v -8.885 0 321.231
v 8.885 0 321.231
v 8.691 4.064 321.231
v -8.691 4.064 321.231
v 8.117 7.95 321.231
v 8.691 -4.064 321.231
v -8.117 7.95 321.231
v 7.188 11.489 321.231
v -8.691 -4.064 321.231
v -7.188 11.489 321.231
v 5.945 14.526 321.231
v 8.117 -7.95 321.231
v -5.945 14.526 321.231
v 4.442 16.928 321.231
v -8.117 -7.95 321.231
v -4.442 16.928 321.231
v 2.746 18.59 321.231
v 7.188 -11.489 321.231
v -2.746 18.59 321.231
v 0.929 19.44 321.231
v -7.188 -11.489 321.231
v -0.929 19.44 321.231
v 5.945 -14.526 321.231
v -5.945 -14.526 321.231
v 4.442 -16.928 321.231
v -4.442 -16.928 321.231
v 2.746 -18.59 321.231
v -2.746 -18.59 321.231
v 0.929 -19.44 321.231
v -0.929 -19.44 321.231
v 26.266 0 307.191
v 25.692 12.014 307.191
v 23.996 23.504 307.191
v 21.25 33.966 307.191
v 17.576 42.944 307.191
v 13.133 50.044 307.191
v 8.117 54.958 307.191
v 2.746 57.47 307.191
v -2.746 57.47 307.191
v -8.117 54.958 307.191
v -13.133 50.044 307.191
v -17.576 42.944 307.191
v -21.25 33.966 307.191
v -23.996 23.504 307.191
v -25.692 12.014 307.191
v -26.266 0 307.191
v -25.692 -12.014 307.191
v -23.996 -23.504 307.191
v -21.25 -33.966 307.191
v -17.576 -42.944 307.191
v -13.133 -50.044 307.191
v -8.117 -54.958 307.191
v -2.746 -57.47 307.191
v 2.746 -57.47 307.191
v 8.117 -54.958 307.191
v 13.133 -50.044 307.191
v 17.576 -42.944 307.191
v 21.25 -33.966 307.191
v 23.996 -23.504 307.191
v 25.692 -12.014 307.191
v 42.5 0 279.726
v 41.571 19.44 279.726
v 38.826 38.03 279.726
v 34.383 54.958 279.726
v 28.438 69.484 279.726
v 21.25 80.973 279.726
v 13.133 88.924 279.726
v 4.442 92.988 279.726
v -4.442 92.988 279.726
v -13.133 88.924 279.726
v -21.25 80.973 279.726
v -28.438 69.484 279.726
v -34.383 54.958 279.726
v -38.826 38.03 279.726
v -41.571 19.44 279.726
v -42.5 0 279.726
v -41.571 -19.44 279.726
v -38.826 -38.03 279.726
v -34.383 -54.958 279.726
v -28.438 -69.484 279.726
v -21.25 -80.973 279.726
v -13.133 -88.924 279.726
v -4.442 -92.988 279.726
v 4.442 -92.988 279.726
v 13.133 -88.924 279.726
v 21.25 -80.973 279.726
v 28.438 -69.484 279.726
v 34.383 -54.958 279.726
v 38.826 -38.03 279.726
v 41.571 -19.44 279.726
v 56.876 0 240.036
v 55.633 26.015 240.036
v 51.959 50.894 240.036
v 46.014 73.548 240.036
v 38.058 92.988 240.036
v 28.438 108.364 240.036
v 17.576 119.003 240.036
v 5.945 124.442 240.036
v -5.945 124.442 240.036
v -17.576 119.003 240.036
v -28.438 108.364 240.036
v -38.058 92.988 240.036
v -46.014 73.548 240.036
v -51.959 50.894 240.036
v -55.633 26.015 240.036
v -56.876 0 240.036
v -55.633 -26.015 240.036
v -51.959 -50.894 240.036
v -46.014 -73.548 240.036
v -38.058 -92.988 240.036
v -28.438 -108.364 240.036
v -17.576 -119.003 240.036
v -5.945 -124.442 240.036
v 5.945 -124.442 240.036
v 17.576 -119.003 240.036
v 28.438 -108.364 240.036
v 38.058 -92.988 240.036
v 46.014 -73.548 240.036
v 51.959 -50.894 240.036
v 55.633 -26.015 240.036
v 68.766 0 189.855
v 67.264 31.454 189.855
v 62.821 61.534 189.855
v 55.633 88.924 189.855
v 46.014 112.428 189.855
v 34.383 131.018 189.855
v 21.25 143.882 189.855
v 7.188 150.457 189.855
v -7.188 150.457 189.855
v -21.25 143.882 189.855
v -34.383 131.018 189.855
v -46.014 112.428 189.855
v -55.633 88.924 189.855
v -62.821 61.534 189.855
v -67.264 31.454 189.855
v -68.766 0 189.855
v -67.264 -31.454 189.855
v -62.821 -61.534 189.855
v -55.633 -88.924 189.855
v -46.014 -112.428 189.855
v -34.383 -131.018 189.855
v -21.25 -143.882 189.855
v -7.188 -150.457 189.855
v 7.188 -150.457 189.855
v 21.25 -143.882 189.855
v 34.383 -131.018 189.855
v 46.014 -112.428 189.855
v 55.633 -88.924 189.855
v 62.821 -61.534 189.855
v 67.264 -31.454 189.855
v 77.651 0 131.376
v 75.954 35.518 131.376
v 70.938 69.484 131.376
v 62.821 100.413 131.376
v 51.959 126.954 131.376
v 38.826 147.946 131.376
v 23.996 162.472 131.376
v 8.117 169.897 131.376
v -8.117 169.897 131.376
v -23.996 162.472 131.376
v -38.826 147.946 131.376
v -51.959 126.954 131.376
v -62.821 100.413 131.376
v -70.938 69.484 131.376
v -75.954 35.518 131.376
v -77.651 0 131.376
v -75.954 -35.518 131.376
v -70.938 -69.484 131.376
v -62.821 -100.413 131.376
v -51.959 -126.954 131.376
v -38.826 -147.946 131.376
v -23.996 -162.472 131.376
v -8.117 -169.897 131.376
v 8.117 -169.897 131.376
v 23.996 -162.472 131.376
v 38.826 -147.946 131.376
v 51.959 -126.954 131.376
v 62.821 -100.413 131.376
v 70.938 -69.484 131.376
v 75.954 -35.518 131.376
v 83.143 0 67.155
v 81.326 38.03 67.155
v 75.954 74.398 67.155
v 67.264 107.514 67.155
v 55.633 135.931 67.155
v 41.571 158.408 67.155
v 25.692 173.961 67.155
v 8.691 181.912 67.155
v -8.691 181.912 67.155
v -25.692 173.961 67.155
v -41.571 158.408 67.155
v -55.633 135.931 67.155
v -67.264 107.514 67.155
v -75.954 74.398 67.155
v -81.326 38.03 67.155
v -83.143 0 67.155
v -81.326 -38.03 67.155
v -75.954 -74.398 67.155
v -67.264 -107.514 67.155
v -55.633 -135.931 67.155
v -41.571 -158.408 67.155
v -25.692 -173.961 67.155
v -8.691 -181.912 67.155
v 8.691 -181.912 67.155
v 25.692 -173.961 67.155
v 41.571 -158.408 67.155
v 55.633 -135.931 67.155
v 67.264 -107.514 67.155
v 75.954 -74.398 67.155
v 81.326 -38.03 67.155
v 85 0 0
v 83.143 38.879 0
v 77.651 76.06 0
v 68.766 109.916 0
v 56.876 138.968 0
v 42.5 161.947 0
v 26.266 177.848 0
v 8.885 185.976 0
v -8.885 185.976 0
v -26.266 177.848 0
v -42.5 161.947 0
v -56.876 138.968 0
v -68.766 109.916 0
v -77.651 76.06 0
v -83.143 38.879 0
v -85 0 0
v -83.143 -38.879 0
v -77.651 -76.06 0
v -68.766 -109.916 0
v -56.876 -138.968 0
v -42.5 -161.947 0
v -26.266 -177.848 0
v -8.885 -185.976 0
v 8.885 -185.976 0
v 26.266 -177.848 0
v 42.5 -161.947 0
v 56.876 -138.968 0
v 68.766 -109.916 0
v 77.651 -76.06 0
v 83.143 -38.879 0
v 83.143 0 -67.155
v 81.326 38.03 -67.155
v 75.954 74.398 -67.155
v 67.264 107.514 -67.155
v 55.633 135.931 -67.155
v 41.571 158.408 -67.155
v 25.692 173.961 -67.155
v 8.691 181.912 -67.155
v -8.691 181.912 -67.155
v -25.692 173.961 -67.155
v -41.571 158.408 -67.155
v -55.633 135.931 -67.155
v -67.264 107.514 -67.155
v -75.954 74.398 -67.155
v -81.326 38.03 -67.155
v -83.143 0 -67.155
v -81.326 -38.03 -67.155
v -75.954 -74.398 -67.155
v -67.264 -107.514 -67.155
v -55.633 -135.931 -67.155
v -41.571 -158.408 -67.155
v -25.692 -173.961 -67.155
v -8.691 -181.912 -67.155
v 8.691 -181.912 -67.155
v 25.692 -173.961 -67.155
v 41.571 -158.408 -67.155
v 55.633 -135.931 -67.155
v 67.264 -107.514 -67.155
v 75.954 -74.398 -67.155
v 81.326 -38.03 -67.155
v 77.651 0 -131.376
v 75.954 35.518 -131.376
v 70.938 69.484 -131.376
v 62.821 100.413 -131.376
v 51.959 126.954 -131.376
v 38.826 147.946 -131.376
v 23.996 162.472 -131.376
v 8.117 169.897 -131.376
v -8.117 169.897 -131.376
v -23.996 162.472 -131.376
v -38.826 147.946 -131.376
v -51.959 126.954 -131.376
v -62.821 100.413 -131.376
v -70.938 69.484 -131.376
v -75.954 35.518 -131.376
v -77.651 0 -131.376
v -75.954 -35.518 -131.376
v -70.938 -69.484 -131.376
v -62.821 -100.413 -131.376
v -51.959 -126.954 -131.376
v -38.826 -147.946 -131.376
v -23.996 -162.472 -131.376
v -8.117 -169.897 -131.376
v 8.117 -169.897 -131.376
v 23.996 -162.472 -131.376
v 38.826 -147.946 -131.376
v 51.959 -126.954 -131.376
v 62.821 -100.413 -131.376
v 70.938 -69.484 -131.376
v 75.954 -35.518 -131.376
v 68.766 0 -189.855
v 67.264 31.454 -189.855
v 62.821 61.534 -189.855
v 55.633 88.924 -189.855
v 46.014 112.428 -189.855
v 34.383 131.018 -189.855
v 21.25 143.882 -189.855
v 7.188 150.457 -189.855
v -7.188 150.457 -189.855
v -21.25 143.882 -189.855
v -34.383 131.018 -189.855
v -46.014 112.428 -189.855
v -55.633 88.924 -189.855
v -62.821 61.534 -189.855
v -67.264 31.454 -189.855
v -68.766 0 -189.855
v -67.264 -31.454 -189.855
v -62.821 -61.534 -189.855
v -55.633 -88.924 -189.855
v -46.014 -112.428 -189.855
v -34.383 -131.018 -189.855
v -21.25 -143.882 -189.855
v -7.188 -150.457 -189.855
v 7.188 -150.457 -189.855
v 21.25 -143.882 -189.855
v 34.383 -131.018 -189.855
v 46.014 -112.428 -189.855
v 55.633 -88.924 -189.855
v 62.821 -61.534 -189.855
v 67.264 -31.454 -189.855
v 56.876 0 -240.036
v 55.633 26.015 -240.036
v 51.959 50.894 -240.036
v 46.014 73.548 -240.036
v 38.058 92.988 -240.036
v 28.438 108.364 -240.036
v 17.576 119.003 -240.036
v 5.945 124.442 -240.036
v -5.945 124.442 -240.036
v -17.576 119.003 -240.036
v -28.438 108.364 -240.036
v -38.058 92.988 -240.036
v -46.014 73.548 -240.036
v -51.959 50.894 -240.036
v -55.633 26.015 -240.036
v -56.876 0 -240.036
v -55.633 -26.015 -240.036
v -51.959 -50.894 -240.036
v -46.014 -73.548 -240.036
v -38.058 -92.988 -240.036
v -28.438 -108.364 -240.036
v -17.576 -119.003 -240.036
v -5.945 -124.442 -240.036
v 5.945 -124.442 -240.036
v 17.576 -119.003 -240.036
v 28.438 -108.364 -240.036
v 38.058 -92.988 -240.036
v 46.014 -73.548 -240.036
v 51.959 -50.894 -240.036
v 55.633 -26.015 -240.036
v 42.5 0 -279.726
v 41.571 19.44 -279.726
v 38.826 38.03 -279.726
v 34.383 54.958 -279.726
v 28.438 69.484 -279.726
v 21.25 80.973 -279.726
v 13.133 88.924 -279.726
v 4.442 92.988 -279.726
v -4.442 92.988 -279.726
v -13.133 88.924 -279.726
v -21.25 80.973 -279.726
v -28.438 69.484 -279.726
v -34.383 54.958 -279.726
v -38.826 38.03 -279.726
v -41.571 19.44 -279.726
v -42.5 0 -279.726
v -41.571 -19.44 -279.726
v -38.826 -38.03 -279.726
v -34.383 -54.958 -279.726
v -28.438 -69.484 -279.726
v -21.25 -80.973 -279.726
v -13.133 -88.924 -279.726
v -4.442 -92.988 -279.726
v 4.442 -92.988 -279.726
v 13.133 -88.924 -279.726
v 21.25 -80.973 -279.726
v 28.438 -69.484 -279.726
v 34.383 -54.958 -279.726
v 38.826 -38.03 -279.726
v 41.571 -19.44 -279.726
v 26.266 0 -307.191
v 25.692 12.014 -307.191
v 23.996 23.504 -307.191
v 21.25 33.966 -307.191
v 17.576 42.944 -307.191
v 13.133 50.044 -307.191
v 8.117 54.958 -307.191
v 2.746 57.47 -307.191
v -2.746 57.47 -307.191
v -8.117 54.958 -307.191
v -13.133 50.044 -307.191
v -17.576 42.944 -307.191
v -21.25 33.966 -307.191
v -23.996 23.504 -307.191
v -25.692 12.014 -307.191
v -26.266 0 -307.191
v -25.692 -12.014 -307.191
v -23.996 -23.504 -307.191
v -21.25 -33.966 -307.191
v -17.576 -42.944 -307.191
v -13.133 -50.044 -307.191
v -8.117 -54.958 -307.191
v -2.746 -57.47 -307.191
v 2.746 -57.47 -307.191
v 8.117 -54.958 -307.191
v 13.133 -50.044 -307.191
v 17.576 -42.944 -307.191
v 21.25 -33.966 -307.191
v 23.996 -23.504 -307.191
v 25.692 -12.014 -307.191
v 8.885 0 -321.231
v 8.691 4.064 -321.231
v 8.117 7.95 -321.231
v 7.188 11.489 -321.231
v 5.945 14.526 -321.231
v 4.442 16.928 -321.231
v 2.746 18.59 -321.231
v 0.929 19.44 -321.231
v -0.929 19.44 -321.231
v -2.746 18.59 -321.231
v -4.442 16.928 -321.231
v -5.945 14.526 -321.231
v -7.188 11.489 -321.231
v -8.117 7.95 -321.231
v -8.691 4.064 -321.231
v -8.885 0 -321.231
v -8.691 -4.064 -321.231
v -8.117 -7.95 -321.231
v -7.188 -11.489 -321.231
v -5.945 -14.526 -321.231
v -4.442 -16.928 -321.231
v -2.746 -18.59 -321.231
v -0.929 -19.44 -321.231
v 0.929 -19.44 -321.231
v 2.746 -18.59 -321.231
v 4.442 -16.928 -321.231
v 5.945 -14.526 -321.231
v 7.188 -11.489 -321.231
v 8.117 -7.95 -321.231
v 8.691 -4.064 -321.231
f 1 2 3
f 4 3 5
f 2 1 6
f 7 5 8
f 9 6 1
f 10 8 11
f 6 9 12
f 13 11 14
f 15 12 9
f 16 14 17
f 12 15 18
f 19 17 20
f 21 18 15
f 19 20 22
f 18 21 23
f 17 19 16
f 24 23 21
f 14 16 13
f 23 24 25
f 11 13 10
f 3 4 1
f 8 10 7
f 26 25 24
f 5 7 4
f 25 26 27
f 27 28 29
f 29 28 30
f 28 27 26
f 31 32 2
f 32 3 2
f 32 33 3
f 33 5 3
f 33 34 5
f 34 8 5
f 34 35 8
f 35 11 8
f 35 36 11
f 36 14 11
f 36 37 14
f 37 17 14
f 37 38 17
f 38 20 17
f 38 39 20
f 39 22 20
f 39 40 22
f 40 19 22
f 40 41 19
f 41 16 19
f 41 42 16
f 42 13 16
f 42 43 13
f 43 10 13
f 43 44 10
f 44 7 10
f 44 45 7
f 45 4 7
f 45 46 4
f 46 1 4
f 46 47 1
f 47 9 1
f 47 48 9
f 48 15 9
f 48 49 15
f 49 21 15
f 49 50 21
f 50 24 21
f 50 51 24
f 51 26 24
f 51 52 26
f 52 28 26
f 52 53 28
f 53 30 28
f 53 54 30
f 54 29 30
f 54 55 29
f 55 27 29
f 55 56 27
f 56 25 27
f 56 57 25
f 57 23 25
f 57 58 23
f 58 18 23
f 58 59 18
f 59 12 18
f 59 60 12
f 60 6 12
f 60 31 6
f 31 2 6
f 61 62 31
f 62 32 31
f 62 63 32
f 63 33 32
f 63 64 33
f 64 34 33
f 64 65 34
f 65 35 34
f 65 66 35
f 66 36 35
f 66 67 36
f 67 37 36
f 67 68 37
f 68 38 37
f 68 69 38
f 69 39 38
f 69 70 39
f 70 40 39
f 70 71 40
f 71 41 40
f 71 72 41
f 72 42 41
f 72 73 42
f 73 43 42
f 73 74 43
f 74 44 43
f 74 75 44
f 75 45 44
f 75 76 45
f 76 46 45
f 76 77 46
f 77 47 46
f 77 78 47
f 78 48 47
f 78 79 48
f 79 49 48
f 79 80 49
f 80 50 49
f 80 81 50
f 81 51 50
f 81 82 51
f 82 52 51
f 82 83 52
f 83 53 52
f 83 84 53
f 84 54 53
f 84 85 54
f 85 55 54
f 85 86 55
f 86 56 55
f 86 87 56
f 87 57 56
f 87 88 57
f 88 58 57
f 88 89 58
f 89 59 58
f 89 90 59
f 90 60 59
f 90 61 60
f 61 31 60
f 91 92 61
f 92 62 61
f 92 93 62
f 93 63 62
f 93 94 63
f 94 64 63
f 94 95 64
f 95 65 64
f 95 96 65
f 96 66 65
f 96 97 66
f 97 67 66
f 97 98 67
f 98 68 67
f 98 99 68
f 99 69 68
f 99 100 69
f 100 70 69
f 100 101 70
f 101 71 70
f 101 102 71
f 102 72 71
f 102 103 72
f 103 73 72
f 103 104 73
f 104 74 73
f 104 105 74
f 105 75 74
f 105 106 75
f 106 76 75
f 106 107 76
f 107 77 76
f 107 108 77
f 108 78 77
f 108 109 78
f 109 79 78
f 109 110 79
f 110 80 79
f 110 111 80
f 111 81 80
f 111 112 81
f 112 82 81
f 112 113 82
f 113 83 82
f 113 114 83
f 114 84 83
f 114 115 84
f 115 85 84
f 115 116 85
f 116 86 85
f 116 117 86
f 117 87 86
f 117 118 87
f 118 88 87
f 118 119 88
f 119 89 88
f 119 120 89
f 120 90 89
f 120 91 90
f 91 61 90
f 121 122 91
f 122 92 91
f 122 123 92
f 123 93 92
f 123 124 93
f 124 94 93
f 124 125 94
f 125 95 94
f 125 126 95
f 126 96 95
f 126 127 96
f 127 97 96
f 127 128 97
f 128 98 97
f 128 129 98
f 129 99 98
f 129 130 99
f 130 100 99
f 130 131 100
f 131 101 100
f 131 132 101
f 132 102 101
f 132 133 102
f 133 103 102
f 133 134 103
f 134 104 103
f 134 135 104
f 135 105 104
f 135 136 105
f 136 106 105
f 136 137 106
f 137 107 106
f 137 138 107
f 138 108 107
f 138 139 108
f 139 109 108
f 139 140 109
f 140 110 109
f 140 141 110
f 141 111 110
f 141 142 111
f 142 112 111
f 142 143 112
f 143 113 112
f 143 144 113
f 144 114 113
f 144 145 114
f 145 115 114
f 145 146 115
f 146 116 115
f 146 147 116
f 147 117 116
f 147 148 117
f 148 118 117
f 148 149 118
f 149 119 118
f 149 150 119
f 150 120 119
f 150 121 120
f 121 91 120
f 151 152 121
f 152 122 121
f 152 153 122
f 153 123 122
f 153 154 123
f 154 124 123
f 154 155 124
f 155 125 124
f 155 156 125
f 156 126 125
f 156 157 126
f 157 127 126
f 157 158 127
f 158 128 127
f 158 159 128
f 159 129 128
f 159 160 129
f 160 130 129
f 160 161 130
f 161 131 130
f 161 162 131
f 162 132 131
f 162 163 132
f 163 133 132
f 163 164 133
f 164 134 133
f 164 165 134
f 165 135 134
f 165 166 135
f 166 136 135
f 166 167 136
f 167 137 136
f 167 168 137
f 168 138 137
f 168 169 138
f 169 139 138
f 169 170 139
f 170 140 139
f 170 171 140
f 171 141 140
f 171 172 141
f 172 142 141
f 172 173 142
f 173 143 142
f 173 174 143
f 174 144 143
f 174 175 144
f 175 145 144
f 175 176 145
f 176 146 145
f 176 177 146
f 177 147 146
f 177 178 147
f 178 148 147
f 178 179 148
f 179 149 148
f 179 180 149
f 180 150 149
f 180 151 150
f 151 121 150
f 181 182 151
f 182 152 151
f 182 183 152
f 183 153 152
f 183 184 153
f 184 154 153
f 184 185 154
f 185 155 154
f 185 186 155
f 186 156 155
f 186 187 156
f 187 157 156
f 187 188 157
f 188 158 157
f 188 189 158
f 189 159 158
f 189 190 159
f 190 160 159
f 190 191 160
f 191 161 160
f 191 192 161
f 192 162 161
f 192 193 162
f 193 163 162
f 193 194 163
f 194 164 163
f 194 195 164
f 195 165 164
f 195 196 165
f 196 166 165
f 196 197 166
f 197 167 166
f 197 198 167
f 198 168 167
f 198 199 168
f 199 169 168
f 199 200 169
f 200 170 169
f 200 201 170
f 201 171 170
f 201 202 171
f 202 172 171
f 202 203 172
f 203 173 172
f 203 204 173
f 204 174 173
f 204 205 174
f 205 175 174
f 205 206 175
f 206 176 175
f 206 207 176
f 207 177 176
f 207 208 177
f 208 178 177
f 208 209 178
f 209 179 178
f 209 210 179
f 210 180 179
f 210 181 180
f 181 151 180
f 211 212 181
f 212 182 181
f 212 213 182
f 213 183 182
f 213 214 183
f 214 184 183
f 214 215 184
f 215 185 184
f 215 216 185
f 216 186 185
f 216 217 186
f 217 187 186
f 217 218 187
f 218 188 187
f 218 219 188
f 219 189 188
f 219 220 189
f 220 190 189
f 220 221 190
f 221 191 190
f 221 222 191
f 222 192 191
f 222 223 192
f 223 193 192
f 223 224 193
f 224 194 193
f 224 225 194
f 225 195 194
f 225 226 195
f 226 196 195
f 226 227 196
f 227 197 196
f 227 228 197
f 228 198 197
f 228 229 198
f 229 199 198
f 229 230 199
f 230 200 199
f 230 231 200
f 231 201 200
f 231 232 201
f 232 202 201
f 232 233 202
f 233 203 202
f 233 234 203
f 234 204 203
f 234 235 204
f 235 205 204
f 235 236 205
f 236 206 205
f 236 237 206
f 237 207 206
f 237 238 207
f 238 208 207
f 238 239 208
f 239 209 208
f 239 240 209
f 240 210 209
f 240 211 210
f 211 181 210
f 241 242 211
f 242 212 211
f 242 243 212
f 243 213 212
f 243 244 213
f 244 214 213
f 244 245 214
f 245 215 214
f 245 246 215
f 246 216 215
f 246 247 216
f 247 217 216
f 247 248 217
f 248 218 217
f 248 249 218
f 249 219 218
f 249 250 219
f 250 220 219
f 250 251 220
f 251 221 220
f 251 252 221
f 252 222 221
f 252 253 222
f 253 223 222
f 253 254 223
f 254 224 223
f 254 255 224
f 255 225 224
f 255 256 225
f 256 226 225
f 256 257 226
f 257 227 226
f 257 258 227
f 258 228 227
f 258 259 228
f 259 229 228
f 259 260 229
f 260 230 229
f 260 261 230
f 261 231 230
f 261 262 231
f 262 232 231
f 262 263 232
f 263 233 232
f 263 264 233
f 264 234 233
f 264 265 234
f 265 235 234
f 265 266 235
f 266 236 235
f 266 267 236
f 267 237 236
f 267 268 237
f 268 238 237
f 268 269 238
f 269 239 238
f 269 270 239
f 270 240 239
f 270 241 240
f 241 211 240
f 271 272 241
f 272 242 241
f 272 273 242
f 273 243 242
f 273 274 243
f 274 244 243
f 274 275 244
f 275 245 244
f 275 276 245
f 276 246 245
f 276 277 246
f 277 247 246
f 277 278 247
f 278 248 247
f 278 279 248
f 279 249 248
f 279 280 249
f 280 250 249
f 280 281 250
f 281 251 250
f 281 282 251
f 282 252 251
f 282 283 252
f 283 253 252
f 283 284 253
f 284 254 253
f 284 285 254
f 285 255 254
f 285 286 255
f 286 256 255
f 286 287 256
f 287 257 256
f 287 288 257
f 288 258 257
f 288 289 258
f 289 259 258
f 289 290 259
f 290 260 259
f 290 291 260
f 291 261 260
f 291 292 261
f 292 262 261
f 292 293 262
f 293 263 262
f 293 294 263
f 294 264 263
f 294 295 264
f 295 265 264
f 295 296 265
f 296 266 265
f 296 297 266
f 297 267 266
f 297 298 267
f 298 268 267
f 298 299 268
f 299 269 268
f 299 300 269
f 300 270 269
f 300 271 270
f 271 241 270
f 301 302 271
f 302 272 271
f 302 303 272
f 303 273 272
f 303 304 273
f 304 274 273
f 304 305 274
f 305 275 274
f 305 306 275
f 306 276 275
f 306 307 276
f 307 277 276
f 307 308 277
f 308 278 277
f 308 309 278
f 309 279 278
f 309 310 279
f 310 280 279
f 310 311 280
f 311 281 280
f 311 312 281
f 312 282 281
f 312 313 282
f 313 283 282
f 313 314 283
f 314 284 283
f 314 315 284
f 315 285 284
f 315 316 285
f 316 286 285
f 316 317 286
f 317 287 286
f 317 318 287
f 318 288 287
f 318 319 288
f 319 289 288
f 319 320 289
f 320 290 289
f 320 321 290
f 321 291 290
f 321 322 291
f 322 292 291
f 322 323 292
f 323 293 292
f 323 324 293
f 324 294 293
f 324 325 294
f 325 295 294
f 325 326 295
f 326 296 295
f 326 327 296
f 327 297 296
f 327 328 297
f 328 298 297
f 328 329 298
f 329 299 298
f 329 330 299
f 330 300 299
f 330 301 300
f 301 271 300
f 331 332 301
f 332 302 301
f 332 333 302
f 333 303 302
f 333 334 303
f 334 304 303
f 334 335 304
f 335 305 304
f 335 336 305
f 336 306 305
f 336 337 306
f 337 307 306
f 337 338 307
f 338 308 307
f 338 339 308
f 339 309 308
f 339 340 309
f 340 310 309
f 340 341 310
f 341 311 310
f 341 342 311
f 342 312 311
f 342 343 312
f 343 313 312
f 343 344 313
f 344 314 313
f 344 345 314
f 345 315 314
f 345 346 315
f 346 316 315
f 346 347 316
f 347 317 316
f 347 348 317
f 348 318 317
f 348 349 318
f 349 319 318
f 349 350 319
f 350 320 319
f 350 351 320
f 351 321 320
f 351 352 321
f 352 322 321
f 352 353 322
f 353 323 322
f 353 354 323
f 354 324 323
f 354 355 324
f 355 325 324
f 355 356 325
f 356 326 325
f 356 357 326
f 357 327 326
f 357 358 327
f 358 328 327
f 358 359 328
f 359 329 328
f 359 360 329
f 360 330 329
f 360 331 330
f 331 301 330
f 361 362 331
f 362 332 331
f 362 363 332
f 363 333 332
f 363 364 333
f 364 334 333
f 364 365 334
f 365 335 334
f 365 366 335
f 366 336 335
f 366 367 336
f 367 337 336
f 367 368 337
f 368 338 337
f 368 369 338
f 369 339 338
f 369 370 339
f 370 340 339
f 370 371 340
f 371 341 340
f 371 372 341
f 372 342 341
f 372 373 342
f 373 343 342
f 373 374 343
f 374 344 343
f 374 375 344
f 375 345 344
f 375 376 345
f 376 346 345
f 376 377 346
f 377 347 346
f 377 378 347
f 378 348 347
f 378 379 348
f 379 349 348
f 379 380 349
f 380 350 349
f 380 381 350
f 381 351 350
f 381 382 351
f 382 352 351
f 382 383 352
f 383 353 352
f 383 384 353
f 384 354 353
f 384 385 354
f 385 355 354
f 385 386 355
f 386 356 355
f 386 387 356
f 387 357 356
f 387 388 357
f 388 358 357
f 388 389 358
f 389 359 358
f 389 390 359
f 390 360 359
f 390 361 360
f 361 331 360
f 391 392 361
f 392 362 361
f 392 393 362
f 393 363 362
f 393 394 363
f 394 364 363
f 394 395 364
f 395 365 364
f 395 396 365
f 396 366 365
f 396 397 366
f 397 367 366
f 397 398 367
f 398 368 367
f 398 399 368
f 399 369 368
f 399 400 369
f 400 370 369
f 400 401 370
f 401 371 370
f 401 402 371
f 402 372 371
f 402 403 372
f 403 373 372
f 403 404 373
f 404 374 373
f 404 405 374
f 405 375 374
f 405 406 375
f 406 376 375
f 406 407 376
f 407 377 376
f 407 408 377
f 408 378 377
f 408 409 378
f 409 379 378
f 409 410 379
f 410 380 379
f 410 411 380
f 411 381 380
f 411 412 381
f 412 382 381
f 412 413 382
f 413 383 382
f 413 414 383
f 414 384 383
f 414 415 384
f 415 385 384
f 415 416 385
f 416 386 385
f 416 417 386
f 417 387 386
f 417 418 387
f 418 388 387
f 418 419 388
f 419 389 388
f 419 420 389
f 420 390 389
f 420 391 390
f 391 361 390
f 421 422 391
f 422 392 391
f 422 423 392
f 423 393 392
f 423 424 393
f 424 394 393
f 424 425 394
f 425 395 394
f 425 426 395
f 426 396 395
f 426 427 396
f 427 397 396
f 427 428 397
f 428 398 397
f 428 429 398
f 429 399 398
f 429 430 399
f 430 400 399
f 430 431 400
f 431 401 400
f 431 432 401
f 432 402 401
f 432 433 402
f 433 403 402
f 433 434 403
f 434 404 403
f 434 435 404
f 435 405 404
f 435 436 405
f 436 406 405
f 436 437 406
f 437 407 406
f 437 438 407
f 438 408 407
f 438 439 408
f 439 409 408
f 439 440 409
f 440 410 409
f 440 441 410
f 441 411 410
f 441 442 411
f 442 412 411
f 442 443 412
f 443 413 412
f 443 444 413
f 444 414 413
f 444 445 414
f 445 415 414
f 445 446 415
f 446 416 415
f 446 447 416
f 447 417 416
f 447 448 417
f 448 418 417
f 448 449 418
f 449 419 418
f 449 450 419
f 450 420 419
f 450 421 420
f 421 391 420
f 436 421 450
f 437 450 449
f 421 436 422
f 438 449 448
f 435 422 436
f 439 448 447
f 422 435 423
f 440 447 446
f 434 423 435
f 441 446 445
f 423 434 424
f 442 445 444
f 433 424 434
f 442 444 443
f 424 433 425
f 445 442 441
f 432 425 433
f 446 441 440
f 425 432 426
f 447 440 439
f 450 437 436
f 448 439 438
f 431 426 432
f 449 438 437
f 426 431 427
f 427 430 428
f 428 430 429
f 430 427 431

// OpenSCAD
// Generated by SolidPython 1.0.1 on 2020-07-29 00:46:46


scale(v = [5, 11, 19]) {
	sphere(r = 17);
}
/***********************************************
*********      SolidPython code:      **********
************************************************
 
# import packages: SolidPython
from solid import *
from solid.utils import *
from itertools import chain, combinations, permutations


class Resize:

    def __init__(self, scad_file):
        self.scad_file = scad_file
        #self.scad_file = import_scad(scad_file)
        # cone/cylinder param:
        self.r1 = 0
        self.r2 = 0
        self.h = 0
        # rectangular prism param:
        self.w = 0
        self.l = 0
        # ellipse param:
        self.r = 0

    # import OpenScad code (file name corresponds to shape)


    # classify shape + parameters
    def assign(self, param1, param2, param3):
        if self.scad_file == 'cone.scad':
            self.r1 = param1
            self.r2 = param2
            self.h = param3
        elif self.scad_file == 'cylinder.scad':
            self.r1 = param1
            self.r2 = param2
            self.h = param3
        elif self.scad_file == 'rectangularPrism.scad':
            self.h = param1
            self.l = param2
            self.w = param3
        else:
            self.r = param1
            self.h = param2

    # resize parameters
    def iterate(self):
        x = range(3, 20, 2)
        i = 1
        if self.scad_file == 'cone.scad':
            tempList = list(permutations(x, 2))
            for temp in tempList:
                param1 = temp[0]
                param2 = temp[1]
                filepath = 'produced_scad_files/' + 'cone' + str(param1) + '_' + str(param2) + '_' + '.scad'
                scad_render_to_file(cylinder(h=param1, r1=param2, r2=0), filepath)

        elif self.scad_file == 'cylinder.scad':
            tempList = list(permutations(x, 3))
            for temp in tempList:
                param1 = temp[0]
                param2 = temp[1]
                filepath = 'produced_scad_files/' + 'cylinder' + str(param1) + '_' + str(param2) + '_' + '.scad'
                scad_render_to_file(cylinder(h=param1, r1=param2, r2=param2), filepath)

        elif self.scad_file == 'rectangularPrism.scad':
            tempList = list(permutations(x, 3))
            for temp in tempList:
                param1 = temp[0]
                param2 = temp[1]
                param3 = temp[2]
                filepath = 'produced_scad_files/' + 'rectangularPrism' + str(param1) + '_' + str(param2) + '_' + str(
                    param3) + '.scad'
                scad_render_to_file(cube(size=(param1, param2, param3)), filepath)

        elif self.scad_file == 'ellipse.scad':
            tempList = list(permutations(x, 4))
            for temp in tempList:
                param1 = temp[0]
                param2 = temp[1]
                param3 = temp[2]
                param4 = temp[3]
                filepath = 'produced_scad_files/' + 'ellipse' + str(param1) + '_' + str(param2) + '_' + str(param3) + '_' + str(param4) + '.scad'
                scad_render_to_file(scale([param1, param2, param3])(sphere(r=param4)), filepath)

    def render_to_scadfile(self):
        scad_render_to_file(scad, 'example.scad') 
 
************************************************/
